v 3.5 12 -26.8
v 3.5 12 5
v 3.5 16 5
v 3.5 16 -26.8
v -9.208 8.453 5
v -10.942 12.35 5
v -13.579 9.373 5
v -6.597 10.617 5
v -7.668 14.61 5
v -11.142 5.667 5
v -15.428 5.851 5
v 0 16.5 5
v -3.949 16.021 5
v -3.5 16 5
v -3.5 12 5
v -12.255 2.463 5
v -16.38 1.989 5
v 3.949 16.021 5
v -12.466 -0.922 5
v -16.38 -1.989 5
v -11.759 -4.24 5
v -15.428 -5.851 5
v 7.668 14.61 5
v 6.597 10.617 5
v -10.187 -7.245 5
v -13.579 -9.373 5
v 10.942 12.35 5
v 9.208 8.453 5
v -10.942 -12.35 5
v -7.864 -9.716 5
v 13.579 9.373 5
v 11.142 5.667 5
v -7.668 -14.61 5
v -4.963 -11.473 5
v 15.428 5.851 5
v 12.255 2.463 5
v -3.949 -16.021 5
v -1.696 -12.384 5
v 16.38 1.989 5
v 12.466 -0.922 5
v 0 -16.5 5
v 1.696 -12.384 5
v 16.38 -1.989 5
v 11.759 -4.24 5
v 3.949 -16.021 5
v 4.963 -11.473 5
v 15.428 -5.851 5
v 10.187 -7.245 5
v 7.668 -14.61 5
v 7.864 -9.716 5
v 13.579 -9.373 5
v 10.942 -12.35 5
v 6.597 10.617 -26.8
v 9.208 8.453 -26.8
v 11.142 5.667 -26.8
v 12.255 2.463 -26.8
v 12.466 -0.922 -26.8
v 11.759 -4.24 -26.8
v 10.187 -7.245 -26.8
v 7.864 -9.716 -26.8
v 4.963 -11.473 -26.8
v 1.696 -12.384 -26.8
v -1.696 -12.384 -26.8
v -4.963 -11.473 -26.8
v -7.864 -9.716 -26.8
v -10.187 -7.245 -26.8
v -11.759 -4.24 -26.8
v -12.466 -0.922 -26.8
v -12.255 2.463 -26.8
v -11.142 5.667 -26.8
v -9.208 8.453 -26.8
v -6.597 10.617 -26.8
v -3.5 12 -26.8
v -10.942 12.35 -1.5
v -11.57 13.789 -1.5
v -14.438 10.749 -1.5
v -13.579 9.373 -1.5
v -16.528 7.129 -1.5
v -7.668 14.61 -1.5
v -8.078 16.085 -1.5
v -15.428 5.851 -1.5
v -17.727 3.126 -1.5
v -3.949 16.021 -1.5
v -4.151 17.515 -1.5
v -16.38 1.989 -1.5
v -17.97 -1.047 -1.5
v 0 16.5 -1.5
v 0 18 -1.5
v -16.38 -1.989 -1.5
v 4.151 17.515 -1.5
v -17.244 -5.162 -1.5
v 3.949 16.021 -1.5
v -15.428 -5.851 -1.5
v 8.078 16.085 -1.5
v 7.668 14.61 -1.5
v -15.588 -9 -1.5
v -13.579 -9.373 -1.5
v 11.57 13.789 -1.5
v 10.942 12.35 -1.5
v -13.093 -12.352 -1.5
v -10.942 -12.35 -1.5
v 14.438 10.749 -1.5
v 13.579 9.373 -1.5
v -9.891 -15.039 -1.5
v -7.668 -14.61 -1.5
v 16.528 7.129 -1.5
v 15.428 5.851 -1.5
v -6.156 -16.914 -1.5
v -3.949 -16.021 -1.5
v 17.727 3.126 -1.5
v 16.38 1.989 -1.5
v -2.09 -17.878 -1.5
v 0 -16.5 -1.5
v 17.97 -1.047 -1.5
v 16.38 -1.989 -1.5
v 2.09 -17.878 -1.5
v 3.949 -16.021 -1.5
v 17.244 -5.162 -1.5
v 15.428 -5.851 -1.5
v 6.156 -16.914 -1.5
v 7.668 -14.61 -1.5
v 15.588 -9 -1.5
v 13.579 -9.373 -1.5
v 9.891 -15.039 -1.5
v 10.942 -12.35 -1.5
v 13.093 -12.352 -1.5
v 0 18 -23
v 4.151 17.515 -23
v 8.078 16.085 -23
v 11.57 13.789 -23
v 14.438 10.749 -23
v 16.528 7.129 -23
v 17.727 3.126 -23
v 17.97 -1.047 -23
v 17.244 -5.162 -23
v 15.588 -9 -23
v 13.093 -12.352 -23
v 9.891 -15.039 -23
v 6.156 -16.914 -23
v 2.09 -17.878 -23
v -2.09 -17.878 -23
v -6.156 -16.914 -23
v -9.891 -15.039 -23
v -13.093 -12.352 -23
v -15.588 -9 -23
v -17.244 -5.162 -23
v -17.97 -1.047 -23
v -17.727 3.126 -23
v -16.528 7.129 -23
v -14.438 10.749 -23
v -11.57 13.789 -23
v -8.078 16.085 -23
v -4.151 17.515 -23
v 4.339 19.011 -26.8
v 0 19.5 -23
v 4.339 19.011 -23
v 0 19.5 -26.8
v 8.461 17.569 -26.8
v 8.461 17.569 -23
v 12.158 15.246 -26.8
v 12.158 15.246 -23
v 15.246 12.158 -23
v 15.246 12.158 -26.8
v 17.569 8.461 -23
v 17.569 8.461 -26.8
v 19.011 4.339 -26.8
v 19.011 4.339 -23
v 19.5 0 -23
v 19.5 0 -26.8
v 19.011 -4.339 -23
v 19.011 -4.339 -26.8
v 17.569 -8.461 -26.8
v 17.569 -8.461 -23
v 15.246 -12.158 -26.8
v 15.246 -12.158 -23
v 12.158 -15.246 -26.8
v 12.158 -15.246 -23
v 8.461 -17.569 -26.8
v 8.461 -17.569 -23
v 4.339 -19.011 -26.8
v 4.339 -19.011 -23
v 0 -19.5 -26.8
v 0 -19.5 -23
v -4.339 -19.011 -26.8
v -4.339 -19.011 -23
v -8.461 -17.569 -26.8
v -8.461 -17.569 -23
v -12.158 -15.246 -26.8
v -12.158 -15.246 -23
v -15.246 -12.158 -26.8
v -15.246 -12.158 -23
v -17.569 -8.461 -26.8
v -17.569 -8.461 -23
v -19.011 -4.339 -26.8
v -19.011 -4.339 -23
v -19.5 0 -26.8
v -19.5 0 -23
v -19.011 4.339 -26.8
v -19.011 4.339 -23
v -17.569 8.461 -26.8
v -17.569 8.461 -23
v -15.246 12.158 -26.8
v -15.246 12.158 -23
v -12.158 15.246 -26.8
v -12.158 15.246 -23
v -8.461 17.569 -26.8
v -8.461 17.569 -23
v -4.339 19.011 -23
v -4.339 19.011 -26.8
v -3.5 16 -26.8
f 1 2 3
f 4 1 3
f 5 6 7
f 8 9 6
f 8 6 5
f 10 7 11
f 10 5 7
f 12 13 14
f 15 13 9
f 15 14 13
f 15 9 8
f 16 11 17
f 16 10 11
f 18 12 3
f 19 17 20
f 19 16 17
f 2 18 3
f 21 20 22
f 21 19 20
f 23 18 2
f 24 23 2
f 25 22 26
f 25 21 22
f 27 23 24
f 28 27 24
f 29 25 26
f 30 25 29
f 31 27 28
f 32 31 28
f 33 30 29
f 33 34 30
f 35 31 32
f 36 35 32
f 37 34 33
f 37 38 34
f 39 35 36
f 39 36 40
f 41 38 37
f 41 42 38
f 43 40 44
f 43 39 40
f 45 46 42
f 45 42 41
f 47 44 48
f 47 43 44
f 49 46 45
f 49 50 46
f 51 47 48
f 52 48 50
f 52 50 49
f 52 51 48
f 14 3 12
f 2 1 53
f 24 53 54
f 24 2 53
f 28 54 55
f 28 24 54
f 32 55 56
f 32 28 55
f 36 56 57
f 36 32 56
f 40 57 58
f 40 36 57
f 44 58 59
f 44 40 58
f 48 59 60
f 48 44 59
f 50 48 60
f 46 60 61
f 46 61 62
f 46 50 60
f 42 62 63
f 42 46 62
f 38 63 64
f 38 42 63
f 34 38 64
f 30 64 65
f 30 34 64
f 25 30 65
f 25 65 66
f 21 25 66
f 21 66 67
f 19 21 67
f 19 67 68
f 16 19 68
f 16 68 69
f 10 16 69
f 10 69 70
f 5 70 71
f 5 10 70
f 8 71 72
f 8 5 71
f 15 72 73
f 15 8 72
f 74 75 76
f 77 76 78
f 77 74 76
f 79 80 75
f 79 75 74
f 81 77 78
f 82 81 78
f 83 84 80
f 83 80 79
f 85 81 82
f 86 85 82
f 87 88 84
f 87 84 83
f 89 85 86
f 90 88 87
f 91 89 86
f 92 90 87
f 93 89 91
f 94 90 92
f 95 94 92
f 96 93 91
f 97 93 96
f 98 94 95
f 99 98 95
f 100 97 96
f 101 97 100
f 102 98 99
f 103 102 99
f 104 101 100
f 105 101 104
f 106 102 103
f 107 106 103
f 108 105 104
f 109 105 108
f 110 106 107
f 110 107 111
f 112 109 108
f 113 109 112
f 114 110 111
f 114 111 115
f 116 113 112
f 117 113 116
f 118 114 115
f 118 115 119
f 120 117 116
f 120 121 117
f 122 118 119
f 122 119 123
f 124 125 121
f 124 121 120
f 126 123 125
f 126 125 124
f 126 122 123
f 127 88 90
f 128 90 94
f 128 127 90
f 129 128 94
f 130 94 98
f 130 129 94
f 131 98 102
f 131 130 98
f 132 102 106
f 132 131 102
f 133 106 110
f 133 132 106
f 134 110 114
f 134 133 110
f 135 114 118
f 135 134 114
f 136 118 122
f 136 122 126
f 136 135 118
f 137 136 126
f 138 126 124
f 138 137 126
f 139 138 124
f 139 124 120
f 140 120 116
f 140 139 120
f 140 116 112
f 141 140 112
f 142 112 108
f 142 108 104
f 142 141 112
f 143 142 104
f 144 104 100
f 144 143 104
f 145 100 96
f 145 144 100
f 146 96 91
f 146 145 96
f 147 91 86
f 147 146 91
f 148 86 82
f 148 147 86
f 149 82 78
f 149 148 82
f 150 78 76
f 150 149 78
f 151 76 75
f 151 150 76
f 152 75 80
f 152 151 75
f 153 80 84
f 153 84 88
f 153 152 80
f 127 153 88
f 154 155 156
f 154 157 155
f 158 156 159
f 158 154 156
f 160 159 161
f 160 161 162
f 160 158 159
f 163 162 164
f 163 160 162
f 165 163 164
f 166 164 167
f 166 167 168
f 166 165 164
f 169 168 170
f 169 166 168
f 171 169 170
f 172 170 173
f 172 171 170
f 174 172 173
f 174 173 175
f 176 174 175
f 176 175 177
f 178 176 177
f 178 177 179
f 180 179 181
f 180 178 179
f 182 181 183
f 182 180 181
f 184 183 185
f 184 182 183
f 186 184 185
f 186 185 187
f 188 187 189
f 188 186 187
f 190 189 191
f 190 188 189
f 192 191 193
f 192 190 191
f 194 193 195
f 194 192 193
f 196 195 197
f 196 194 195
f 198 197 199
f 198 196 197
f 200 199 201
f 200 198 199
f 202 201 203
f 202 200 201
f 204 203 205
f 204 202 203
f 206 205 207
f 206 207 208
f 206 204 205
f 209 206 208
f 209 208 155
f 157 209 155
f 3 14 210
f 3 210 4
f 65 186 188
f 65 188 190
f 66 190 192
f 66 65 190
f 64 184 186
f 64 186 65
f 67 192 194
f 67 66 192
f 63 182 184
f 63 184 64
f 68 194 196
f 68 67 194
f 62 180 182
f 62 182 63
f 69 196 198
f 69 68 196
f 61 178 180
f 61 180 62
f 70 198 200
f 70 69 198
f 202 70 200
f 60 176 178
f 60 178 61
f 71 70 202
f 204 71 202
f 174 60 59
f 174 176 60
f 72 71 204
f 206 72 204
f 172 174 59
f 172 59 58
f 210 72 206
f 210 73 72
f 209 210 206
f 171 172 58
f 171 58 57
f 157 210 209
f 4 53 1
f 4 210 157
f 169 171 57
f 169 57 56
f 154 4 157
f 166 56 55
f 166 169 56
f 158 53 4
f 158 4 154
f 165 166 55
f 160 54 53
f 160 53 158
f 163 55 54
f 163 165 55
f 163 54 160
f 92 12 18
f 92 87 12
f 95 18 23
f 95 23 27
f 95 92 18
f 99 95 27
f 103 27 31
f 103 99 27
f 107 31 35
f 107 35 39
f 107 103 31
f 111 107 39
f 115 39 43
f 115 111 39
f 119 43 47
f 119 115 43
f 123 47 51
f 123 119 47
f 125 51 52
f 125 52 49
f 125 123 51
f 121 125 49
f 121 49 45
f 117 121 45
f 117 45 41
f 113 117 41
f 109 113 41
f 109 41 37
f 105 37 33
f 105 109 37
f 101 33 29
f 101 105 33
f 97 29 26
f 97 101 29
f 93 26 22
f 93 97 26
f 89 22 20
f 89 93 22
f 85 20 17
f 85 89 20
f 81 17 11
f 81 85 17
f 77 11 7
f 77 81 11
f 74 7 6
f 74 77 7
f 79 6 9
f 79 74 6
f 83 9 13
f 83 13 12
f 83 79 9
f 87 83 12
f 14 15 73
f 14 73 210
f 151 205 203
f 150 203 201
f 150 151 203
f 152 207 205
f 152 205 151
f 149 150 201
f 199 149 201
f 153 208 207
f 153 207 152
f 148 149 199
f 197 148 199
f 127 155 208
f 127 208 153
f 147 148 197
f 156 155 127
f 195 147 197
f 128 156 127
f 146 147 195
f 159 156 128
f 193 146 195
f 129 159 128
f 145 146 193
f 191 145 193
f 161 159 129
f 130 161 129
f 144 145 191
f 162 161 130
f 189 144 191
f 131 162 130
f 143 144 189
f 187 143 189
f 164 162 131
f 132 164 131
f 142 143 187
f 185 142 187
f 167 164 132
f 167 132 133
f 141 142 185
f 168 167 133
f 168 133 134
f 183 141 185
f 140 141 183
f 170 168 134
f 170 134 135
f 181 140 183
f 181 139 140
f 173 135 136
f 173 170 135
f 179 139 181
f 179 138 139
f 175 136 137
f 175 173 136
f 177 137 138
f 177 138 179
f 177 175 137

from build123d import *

# Parameters (mm, degrees)
SKETCH_2_W          = 7
SKETCH_2_H          = 7
CUT_EXTRUDE_1_DEPTH = 32.8


with BuildPart() as part:
    # Эскиз1 → Повернуть1 (revolve)
    with BuildSketch(Plane(origin=(0, 0, 0), x_dir=(0, 0, -1), z_dir=(1, 0, 0))):
        Polygon((26.8, 12.5), (-5, 12.5), (-5, 16.5), (1.5, 16.5), (1.5, 18), (23, 18), (23, 19.5), (26.8, 19.5), align=None)
    revolve(axis=Axis((0, 0, 1000), (0, 0, -1)))

    # Эскиз2 → Вырез-Вытянуть1 (cut, through all)
    with BuildSketch(Plane.XY.offset(5)):
        with Locations((0, 12.5)):
            Rectangle(SKETCH_2_W, SKETCH_2_H)
    extrude(amount=-CUT_EXTRUDE_1_DEPTH, mode=Mode.SUBTRACT)


solid = part.part
